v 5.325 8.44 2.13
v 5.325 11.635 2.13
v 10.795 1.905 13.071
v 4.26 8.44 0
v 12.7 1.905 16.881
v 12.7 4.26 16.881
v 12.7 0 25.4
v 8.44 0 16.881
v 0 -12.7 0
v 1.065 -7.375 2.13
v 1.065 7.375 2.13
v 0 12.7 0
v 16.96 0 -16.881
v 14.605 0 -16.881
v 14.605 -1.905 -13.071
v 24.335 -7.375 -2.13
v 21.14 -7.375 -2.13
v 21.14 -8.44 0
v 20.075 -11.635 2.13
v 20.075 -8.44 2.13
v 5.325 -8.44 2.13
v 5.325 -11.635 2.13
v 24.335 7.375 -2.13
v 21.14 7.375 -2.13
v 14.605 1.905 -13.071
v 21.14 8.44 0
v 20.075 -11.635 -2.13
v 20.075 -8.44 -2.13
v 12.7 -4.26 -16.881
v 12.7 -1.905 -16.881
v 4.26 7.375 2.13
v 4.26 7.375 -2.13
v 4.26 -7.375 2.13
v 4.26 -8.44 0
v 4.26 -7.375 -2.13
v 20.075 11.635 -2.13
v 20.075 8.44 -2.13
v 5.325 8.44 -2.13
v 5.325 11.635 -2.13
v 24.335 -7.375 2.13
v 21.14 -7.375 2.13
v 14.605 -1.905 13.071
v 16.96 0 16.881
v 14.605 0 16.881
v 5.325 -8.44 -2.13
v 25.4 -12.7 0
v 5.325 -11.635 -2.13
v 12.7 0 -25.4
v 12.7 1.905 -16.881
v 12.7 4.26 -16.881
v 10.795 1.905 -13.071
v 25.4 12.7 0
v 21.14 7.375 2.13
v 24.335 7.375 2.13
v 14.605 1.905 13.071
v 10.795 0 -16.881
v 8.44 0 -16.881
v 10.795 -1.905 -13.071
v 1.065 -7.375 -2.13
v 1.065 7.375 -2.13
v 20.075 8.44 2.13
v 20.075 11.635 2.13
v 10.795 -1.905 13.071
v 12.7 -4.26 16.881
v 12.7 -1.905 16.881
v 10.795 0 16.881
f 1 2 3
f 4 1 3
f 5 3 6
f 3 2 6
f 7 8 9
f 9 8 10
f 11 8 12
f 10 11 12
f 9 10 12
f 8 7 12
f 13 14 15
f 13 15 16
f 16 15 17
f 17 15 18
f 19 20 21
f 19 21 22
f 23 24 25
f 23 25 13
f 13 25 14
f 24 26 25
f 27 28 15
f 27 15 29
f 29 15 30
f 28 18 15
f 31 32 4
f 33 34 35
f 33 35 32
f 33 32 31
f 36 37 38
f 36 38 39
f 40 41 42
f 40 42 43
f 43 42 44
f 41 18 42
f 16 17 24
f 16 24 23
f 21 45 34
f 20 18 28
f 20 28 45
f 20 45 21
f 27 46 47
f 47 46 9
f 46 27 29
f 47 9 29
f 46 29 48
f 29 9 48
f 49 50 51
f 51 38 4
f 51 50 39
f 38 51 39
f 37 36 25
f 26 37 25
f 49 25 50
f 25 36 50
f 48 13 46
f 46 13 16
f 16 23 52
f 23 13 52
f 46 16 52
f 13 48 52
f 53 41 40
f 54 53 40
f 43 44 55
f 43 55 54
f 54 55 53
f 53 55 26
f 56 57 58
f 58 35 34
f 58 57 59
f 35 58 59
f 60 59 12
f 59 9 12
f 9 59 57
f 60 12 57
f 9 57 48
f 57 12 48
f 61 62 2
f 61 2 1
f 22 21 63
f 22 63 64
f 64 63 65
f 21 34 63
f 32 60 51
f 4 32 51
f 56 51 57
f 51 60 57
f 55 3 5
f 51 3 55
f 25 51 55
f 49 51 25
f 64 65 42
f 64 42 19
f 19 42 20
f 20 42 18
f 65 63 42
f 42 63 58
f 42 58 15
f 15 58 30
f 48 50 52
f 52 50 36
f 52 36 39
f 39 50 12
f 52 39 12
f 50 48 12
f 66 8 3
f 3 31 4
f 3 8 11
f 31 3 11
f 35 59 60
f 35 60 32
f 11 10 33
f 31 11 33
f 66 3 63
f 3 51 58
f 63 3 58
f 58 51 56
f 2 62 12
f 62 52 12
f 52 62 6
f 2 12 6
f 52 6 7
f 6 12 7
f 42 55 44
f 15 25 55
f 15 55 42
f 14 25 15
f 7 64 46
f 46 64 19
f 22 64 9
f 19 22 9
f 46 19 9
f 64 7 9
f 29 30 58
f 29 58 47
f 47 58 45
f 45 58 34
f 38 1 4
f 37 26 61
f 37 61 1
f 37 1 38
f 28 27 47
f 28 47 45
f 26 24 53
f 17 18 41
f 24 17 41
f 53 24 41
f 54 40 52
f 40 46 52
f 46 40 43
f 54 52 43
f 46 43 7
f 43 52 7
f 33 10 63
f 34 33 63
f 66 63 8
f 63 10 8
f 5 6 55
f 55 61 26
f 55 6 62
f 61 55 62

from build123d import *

# Parameters (mm, degrees)
F0_W      = 25.4
F0_H      = 50.8
F1_DEPTH  = 25.4
F5_DEPTH  = 25.4
F6_DEPTH  = 25.4
F4_W      = 3.81
F4_H      = 3.81
F7_DEPTH  = 50.8
F9_DEPTH  = 25.4
F10_W     = 4.259707
F10_H     = 4.259707
F11_DEPTH = 25.4
F12_DEPTH = 25.4
F13_DEPTH = 25.4


with BuildPart() as f1:
    # F0 (on Right) → F1 (new body)
    with BuildSketch(Plane.YZ):
        Rectangle(F0_W, F0_H)
    extrude(amount=F1_DEPTH)

    # F2 (on face) → F5 (cut)
    with BuildSketch(Plane(origin=(0, 0, 0), x_dir=(0, -1, 0), z_dir=(-1, 0, 0))):
        Polygon((8.4402905029, 0), (0, 16.8805810057), (-8.4402905029, 0), (0, -16.8805810057), align=None)
    extrude(amount=-F5_DEPTH, mode=Mode.SUBTRACT)

    # F3 (on face) → F6 (cut)
    with BuildSketch(Plane(origin=(0, 12.7, 0), x_dir=(-1, 0, 0), z_dir=(0, 1, 0))):
        Polygon((-12.7, 16.8805810057), (-21.1402905029, 0), (-12.7, -16.8805810057), (-4.2597094971, 0), align=None)
    extrude(amount=-F6_DEPTH, mode=Mode.SUBTRACT)

    # F4 (on face) → F7 (join)
    with BuildSketch(Plane(origin=(0, 0, -25.4), x_dir=(1, 0, 0), z_dir=(0, 0, -1))):
        with Locations((12.7, 0)):
            Rectangle(F4_W, F4_H)
    extrude(amount=-F7_DEPTH)

    # F8 (on face) → F9 (join)
    with BuildSketch(Plane.YZ.offset(25.4)):
        Polygon((-12.7, 2.1298535), (-12.7, -2.1298535), (-8.4402905029, -2.1298535), (-8.4402905029, 0), (-8.4402905029, 2.1298535), align=None)
        Polygon((8.4402905029, -2.1298535), (12.7, -2.1298535), (12.7, 2.1298535), (8.4402905029, 2.1298535), (8.4402905029, 0), align=None)
    extrude(amount=-F9_DEPTH)

    # F10 (on face) → F11 (join)
    with BuildSketch(Plane.XZ.offset(12.7)):
        with Locations((2.1298535, 0)):
            Rectangle(F10_W, F10_H)
        with Locations((23.2701465, 0)):
            Rectangle(F10_W, F10_H)
    extrude(amount=-F11_DEPTH)

    # F3 (on face) → F12 (cut)
    with BuildSketch(Plane(origin=(0, 12.7, 0), x_dir=(-1, 0, 0), z_dir=(0, 1, 0))):
        Polygon((0, 25.4), (-12.7, 25.4), (0, 0), align=None)
        Polygon((-25.4, 0), (-12.7, 25.4), (-25.4, 25.4), align=None)
        Polygon((-12.7, -25.4), (-25.4, 0), (-25.4, -25.4), align=None)
        Polygon((0, -25.4), (0, 0), (-12.7, -25.4), align=None)
    extrude(amount=-F12_DEPTH, mode=Mode.SUBTRACT)

    # F2 (on face) → F13 (cut)
    with BuildSketch(Plane(origin=(0, 0, 0), x_dir=(0, -1, 0), z_dir=(-1, 0, 0))):
        Polygon((-12.7, 0), (0, 25.4), (-12.7, 25.4), align=None)
        Polygon((12.7, 25.4), (0, 25.4), (12.7, 0), align=None)
        Polygon((12.7, -25.4), (12.7, 0), (0, -25.4), align=None)
        Polygon((0, -25.4), (-12.7, 0), (-12.7, -25.4), align=None)
    extrude(amount=-F13_DEPTH, mode=Mode.SUBTRACT)


solid = f1.part
